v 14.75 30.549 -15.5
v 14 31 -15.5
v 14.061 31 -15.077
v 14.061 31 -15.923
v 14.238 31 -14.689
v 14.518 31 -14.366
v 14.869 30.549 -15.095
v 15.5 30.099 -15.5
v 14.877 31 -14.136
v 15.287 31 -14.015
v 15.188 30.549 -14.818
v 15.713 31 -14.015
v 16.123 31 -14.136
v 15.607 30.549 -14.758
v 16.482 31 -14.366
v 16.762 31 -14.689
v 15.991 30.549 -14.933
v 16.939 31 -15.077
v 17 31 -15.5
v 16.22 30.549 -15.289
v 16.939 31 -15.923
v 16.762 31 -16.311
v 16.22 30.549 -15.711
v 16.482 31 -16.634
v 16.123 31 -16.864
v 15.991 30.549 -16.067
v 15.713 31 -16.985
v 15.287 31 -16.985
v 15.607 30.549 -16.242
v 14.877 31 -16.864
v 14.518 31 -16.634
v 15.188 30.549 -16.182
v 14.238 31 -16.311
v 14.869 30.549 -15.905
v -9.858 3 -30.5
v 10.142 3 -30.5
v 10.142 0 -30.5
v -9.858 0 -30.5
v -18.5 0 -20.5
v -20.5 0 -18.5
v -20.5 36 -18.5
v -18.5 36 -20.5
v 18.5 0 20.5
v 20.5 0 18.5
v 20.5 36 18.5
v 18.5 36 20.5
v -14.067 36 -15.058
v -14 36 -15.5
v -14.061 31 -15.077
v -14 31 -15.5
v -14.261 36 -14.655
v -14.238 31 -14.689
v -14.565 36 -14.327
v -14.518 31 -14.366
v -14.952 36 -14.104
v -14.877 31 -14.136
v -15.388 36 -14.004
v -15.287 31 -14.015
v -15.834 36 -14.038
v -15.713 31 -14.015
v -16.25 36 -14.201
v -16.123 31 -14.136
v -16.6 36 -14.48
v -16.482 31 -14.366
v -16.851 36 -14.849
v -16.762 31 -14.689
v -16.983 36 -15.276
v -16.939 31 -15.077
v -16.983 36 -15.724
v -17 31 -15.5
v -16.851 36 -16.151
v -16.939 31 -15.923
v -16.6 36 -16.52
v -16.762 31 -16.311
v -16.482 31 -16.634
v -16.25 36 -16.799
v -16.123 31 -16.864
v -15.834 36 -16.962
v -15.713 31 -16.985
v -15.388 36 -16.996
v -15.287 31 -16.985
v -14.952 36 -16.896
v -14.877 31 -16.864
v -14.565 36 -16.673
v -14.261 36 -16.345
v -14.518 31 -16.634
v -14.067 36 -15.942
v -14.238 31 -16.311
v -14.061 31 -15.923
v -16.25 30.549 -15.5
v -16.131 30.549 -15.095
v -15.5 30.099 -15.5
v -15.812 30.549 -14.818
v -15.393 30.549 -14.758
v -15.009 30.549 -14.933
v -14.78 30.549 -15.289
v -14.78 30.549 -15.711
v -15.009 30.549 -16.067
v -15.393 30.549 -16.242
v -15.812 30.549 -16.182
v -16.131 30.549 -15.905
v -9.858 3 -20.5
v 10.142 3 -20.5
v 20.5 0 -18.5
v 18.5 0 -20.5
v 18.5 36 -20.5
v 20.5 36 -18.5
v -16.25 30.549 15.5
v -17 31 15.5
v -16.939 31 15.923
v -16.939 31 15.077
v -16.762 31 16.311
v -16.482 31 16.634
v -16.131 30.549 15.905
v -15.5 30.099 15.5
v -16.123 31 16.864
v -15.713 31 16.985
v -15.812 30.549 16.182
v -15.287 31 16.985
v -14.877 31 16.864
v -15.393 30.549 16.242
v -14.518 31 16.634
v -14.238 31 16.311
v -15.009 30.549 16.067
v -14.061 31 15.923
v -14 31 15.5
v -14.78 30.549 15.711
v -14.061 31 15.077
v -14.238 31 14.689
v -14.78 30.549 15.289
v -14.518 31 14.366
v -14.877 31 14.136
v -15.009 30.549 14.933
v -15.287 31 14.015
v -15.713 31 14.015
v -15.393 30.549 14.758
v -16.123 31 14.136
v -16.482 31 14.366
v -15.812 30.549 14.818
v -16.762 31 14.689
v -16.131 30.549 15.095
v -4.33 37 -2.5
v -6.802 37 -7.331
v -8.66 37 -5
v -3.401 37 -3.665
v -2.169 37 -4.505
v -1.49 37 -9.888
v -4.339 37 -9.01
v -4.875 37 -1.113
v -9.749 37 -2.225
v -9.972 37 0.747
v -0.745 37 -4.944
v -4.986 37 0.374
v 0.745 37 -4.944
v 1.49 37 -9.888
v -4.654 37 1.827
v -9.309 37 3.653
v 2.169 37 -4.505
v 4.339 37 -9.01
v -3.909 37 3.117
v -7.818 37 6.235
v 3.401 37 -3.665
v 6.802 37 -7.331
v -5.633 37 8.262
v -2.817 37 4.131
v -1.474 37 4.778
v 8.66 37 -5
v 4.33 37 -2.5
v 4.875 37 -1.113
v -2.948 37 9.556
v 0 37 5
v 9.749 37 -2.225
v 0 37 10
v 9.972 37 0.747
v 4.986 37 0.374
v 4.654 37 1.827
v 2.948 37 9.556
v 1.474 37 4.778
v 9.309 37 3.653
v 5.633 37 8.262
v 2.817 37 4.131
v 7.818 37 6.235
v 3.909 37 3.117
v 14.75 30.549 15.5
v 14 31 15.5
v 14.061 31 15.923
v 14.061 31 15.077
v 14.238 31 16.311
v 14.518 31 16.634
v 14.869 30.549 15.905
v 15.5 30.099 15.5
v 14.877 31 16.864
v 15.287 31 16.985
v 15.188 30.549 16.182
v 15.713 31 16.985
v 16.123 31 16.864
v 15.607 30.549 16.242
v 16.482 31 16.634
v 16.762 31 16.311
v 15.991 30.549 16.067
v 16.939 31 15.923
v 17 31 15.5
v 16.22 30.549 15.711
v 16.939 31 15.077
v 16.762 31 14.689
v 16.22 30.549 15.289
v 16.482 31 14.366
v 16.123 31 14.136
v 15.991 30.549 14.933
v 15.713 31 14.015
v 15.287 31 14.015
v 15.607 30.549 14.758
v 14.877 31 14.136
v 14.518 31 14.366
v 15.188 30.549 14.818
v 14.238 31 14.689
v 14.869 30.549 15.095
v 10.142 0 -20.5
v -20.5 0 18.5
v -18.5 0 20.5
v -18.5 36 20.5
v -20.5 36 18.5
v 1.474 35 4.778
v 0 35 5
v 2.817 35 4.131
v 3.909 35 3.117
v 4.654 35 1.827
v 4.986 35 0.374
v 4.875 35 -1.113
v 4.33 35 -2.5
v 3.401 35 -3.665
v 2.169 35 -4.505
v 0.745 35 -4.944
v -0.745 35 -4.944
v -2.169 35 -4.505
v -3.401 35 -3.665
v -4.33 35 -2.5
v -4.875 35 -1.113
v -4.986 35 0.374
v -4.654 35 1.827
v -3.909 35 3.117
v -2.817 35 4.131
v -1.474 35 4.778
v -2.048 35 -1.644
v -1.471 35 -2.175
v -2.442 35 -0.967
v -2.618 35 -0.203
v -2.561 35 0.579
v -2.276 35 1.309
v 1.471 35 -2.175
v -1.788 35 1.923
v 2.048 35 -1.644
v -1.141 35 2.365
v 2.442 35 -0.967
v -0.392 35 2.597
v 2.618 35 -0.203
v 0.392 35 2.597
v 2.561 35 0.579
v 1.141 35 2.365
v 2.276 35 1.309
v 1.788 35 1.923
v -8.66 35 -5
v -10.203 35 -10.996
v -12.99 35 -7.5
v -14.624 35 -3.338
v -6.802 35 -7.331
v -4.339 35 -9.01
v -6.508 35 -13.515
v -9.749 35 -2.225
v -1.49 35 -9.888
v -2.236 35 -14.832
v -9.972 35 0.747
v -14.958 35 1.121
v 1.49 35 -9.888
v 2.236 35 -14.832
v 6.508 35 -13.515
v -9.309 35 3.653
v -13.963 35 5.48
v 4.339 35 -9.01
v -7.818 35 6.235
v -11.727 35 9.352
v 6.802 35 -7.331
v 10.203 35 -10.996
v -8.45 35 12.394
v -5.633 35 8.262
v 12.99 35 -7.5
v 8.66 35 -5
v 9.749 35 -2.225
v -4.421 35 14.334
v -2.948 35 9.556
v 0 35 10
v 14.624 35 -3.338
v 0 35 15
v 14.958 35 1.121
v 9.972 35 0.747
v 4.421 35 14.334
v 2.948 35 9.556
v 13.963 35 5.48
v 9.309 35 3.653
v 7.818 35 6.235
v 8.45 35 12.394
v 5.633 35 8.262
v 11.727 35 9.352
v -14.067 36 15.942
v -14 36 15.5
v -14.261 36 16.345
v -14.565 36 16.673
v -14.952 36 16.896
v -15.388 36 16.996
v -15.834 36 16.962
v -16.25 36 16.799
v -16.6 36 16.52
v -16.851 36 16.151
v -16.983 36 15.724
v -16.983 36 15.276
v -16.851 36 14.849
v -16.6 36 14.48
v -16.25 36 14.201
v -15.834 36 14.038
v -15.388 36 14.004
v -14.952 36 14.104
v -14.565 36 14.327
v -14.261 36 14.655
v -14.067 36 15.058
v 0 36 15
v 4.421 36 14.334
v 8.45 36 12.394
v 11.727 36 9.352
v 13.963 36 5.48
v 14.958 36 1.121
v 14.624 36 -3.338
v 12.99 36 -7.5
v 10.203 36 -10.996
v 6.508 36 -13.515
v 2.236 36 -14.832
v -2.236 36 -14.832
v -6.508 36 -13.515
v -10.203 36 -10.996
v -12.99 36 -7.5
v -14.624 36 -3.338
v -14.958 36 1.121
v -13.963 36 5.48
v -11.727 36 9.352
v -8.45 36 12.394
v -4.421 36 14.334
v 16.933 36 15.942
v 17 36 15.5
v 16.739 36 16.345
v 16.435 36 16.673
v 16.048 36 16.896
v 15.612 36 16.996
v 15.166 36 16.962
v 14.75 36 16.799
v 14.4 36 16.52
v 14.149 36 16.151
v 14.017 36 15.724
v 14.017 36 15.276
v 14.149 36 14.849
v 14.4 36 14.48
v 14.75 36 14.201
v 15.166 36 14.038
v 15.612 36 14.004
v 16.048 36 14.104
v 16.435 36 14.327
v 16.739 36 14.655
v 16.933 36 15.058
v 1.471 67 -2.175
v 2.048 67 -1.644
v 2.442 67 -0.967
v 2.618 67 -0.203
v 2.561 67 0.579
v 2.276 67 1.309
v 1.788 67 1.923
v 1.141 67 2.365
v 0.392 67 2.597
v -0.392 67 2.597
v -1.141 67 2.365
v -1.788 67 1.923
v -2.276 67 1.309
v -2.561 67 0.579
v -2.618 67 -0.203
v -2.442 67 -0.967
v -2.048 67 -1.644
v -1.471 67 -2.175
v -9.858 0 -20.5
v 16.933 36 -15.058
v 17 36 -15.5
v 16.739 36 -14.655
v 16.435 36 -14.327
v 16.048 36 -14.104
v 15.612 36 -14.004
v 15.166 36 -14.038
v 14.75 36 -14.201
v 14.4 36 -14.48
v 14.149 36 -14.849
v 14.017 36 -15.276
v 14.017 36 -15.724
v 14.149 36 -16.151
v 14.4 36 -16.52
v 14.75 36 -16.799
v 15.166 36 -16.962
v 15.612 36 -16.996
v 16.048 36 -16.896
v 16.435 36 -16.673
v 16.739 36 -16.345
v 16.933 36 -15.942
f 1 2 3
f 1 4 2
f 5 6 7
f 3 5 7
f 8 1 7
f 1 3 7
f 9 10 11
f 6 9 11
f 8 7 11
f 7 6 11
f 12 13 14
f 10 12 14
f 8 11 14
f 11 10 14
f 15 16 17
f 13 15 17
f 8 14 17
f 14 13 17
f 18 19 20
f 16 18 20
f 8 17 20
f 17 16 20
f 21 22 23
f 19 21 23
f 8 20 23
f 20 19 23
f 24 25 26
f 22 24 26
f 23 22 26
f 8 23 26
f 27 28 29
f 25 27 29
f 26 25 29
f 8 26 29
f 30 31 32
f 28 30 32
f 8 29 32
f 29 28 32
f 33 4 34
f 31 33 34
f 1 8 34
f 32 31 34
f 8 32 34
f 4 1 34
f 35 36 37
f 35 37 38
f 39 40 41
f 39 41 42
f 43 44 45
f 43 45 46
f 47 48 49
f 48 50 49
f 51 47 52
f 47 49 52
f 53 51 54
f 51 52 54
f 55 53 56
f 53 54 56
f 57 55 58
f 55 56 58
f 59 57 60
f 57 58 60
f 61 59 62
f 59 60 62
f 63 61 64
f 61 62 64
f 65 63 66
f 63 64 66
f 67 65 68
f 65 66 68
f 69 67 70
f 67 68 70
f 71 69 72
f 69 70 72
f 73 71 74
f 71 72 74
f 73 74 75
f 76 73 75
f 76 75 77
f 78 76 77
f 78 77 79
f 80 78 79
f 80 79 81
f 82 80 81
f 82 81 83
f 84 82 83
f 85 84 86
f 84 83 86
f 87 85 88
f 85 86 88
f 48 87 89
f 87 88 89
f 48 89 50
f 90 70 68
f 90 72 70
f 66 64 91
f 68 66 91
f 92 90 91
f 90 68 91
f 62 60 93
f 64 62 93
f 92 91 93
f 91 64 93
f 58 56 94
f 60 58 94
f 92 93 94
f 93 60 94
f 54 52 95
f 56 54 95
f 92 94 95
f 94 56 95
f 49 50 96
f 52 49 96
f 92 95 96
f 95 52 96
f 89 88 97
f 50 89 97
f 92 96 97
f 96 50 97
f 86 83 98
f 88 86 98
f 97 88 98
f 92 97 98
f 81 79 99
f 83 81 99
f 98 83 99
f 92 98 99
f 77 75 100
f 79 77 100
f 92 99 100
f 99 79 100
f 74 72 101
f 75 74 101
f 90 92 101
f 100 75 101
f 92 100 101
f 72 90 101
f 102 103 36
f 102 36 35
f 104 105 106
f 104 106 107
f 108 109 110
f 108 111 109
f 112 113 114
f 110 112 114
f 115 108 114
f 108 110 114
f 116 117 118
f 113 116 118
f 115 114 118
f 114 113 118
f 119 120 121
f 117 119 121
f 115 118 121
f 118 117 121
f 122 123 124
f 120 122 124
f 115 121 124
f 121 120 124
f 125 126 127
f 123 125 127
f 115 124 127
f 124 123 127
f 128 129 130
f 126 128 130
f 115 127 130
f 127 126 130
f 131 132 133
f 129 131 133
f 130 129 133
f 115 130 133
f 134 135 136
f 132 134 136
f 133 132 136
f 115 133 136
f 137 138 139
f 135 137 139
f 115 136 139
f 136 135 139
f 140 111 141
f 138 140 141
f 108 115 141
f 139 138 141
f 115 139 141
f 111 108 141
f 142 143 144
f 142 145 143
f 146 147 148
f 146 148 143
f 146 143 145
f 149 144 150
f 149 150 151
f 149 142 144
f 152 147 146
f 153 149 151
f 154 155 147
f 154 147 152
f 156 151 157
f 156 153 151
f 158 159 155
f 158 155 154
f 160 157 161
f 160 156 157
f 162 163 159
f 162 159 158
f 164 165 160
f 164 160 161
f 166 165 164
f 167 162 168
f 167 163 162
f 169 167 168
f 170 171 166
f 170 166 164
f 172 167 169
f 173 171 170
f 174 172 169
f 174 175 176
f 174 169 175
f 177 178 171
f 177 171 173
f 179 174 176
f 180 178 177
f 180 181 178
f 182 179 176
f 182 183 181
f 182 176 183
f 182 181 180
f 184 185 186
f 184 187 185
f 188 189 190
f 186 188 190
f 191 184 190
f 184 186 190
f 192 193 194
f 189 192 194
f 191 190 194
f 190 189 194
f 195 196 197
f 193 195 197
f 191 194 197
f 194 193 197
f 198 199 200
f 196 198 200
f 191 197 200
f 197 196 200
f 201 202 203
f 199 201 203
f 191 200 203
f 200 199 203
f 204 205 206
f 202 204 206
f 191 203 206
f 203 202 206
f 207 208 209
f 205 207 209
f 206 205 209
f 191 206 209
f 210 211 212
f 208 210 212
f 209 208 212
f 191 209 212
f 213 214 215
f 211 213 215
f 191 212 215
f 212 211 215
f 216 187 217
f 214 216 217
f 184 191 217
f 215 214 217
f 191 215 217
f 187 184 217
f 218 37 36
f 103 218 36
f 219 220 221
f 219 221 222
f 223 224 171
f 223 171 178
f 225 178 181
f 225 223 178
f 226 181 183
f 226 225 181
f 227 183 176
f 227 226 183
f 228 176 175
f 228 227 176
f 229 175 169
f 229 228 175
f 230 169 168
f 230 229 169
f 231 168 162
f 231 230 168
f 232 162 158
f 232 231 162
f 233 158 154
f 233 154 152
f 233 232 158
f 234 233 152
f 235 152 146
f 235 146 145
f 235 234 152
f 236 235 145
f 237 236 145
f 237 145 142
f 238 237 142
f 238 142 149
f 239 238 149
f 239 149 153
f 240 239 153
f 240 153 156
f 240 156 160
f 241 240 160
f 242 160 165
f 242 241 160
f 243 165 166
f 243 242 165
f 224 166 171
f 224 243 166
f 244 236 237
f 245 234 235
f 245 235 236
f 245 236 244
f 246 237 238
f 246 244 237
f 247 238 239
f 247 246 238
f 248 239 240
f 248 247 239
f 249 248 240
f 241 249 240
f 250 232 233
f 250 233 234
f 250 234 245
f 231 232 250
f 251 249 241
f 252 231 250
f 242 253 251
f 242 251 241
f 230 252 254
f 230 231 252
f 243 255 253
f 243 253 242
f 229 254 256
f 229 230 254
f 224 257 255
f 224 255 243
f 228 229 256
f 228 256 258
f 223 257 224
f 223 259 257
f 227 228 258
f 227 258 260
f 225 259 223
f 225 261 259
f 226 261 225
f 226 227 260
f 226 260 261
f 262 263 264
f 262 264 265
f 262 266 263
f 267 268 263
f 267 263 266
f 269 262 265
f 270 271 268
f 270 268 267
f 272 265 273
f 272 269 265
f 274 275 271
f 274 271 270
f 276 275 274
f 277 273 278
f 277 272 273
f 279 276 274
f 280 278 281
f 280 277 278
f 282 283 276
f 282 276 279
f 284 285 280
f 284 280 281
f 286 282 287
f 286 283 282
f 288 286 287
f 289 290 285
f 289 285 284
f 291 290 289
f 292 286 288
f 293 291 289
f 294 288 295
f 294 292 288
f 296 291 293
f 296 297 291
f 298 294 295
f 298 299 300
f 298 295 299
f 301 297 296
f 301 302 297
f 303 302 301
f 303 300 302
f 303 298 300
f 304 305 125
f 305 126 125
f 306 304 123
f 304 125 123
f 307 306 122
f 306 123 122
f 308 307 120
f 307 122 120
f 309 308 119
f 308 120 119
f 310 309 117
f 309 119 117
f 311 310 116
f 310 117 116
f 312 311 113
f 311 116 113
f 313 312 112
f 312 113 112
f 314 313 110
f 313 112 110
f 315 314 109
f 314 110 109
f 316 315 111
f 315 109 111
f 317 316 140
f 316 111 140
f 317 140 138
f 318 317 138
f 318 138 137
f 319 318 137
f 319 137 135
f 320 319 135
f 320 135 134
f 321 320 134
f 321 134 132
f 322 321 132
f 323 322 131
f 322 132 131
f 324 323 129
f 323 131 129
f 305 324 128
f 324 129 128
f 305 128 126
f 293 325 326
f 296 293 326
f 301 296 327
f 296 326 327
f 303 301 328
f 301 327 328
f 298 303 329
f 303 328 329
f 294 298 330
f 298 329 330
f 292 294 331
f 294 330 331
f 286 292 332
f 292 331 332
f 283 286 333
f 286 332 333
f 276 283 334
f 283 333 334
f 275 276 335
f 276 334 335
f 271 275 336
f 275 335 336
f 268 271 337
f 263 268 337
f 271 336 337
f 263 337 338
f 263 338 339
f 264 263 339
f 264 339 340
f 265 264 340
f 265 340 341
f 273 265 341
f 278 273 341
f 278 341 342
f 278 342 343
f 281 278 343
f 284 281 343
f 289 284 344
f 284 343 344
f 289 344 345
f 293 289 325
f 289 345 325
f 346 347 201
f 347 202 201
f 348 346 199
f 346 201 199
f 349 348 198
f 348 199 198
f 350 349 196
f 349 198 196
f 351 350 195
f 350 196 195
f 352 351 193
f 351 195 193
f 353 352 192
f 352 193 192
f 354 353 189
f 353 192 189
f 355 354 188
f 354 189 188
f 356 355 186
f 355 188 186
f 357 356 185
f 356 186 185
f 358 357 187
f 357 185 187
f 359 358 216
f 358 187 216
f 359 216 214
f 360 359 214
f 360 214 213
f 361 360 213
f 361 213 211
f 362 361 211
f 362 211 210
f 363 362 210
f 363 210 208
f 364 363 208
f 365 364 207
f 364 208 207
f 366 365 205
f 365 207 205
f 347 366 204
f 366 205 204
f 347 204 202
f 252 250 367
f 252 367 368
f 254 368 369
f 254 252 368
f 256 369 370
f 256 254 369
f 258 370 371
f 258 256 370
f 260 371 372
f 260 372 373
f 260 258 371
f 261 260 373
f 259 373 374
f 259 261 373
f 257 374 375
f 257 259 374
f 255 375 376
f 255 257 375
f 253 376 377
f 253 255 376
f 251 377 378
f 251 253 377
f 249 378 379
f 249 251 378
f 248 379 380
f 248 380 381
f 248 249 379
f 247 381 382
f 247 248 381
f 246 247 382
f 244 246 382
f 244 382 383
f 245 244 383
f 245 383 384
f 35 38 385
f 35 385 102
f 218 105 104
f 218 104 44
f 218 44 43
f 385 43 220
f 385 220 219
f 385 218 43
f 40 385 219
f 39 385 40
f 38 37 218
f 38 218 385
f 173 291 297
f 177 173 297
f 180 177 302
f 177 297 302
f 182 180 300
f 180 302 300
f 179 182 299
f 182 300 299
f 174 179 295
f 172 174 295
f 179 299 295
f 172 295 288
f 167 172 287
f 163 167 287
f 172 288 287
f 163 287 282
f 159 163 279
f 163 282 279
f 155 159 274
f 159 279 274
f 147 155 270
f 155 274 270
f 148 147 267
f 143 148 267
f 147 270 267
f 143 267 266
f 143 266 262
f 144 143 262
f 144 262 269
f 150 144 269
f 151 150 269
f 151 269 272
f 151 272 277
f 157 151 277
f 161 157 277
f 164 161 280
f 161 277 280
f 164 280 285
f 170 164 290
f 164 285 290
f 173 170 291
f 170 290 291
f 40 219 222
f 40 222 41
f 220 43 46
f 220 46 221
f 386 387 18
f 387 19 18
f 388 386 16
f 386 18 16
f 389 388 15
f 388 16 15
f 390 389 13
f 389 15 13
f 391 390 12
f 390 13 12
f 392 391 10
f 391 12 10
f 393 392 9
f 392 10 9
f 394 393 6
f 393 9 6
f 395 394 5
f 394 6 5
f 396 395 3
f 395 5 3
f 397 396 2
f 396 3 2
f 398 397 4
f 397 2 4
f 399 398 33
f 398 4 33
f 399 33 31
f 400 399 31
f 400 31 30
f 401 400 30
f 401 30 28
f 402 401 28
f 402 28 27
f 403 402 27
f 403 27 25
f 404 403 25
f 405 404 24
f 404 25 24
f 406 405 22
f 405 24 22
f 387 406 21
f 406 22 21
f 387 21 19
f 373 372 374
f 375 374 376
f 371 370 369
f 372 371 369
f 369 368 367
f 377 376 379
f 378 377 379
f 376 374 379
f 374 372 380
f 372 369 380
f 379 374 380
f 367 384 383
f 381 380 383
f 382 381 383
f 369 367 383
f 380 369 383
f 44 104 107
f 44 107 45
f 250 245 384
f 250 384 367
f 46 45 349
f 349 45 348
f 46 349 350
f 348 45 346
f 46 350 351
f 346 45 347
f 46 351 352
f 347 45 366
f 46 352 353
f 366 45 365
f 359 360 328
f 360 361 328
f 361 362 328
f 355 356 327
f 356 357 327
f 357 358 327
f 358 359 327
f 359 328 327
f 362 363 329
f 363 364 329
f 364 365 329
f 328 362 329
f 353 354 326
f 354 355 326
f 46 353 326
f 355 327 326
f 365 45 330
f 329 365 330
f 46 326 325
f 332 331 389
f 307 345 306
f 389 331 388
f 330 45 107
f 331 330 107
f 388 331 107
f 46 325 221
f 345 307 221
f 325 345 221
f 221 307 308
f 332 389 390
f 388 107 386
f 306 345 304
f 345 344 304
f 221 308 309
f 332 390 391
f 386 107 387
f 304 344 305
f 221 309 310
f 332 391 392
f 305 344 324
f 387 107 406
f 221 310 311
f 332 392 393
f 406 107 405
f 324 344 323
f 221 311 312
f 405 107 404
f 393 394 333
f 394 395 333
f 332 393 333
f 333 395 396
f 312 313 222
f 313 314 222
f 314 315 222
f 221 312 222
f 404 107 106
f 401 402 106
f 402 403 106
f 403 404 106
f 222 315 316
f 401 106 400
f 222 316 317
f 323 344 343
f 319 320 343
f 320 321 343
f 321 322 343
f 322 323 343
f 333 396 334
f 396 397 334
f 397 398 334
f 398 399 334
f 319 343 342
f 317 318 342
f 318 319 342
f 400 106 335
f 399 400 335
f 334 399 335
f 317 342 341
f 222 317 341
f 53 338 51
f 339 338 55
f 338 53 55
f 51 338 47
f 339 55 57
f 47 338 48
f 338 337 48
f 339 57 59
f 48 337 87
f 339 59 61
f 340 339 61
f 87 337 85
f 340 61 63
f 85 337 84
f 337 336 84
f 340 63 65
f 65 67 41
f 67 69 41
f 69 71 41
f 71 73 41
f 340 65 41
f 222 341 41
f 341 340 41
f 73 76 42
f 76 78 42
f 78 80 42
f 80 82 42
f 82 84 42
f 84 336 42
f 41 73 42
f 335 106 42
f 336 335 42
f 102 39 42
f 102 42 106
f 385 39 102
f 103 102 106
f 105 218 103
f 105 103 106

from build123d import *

# Parameters (mm, degrees)
BOSS_EXTRUDE1_DEPTH          = 36
SKETCH2_R                    = 15
CUT_EXTRUDE1_DEPTH           = 1
SKETCH3_R                    = 10
SKETCH3_R_2                  = 5
BOSS_EXTRUDE2_DEPTH          = 2
BOSS_EXTRUDE3_DEPTH          = 32
F_3_0_3_DIAMETER_HOLE1_D     = 3
F_3_0_3_DIAMETER_HOLE1_DEPTH = 5
F_3_0_3_DIAMETER_HOLE1_TIP   = 0.901290929
SKETCH7_W                    = 20
SKETCH7_H                    = 3
BOSS_EXTRUDE4_DEPTH          = 10


with BuildPart() as part:
    # Sketch1 → Boss-Extrude1 (new body)
    with BuildSketch(Plane(origin=(0, 0, 0), x_dir=(1, 0, 0), z_dir=(0, 1, 0))):
        Polygon((-20.5, 18.5), (-18.5, 20.5), (18.5, 20.5), (20.5, 18.5), (20.5, -18.5), (18.5, -20.5), (-18.5, -20.5), (-20.5, -18.5), align=None)
    extrude(amount=BOSS_EXTRUDE1_DEPTH)

    # Sketch2 → Cut-Extrude1 (cut)
    with BuildSketch(Plane(origin=(0, 36, 0), x_dir=(-1, 0, 0), z_dir=(0, 1, 0))):
        Circle(SKETCH2_R)
    extrude(amount=-CUT_EXTRUDE1_DEPTH, mode=Mode.SUBTRACT)

    # Sketch3 → Boss-Extrude2 (add)
    with BuildSketch(Plane(origin=(0, 35, 0), x_dir=(1, 0, 0), z_dir=(0, 1, 0))):
        Circle(SKETCH3_R)
        Circle(SKETCH3_R_2, mode=Mode.SUBTRACT)
    extrude(amount=BOSS_EXTRUDE2_DEPTH)

    # Sketch4 → Boss-Extrude3 (add)
    with BuildSketch(Plane(origin=(0, 35, 0), x_dir=(1, 0, 0), z_dir=(0, 1, 0))):
        with BuildLine():
            Line((-1.470984161, 2.175359116), (1.470984161, 2.175359116))
            ThreePointArc((1.470984161, 2.175359116), (0, -2.626020123), (-1.470984161, 2.175359116))
        make_face()
    extrude(amount=BOSS_EXTRUDE3_DEPTH)

    # Ø3.0 (3) Diameter Hole1
    with Locations(Plane(origin=(0, 36, 0), x_dir=(-1, 0, 0), z_dir=(0, 1, 0))):
        with Locations((-15.5, -15.5), (15.5, -15.5), (15.5, 15.5), (-15.5, 15.5)):
            Hole(F_3_0_3_DIAMETER_HOLE1_D / 2, depth=F_3_0_3_DIAMETER_HOLE1_DEPTH)
            with Locations((0, 0, -(F_3_0_3_DIAMETER_HOLE1_DEPTH + F_3_0_3_DIAMETER_HOLE1_TIP / 2))):  # 118° drill point
                Cone(0, F_3_0_3_DIAMETER_HOLE1_D / 2, F_3_0_3_DIAMETER_HOLE1_TIP, mode=Mode.SUBTRACT)

    # Sketch7 → Boss-Extrude4 (add)
    with BuildSketch(Plane(origin=(0, 0, -20.5), x_dir=(-1, 0, 0), z_dir=(0, 0, -1))):
        with Locations((-0.141546157, 1.5)):
            Rectangle(SKETCH7_W, SKETCH7_H)
    extrude(amount=BOSS_EXTRUDE4_DEPTH)


solid = part.part
